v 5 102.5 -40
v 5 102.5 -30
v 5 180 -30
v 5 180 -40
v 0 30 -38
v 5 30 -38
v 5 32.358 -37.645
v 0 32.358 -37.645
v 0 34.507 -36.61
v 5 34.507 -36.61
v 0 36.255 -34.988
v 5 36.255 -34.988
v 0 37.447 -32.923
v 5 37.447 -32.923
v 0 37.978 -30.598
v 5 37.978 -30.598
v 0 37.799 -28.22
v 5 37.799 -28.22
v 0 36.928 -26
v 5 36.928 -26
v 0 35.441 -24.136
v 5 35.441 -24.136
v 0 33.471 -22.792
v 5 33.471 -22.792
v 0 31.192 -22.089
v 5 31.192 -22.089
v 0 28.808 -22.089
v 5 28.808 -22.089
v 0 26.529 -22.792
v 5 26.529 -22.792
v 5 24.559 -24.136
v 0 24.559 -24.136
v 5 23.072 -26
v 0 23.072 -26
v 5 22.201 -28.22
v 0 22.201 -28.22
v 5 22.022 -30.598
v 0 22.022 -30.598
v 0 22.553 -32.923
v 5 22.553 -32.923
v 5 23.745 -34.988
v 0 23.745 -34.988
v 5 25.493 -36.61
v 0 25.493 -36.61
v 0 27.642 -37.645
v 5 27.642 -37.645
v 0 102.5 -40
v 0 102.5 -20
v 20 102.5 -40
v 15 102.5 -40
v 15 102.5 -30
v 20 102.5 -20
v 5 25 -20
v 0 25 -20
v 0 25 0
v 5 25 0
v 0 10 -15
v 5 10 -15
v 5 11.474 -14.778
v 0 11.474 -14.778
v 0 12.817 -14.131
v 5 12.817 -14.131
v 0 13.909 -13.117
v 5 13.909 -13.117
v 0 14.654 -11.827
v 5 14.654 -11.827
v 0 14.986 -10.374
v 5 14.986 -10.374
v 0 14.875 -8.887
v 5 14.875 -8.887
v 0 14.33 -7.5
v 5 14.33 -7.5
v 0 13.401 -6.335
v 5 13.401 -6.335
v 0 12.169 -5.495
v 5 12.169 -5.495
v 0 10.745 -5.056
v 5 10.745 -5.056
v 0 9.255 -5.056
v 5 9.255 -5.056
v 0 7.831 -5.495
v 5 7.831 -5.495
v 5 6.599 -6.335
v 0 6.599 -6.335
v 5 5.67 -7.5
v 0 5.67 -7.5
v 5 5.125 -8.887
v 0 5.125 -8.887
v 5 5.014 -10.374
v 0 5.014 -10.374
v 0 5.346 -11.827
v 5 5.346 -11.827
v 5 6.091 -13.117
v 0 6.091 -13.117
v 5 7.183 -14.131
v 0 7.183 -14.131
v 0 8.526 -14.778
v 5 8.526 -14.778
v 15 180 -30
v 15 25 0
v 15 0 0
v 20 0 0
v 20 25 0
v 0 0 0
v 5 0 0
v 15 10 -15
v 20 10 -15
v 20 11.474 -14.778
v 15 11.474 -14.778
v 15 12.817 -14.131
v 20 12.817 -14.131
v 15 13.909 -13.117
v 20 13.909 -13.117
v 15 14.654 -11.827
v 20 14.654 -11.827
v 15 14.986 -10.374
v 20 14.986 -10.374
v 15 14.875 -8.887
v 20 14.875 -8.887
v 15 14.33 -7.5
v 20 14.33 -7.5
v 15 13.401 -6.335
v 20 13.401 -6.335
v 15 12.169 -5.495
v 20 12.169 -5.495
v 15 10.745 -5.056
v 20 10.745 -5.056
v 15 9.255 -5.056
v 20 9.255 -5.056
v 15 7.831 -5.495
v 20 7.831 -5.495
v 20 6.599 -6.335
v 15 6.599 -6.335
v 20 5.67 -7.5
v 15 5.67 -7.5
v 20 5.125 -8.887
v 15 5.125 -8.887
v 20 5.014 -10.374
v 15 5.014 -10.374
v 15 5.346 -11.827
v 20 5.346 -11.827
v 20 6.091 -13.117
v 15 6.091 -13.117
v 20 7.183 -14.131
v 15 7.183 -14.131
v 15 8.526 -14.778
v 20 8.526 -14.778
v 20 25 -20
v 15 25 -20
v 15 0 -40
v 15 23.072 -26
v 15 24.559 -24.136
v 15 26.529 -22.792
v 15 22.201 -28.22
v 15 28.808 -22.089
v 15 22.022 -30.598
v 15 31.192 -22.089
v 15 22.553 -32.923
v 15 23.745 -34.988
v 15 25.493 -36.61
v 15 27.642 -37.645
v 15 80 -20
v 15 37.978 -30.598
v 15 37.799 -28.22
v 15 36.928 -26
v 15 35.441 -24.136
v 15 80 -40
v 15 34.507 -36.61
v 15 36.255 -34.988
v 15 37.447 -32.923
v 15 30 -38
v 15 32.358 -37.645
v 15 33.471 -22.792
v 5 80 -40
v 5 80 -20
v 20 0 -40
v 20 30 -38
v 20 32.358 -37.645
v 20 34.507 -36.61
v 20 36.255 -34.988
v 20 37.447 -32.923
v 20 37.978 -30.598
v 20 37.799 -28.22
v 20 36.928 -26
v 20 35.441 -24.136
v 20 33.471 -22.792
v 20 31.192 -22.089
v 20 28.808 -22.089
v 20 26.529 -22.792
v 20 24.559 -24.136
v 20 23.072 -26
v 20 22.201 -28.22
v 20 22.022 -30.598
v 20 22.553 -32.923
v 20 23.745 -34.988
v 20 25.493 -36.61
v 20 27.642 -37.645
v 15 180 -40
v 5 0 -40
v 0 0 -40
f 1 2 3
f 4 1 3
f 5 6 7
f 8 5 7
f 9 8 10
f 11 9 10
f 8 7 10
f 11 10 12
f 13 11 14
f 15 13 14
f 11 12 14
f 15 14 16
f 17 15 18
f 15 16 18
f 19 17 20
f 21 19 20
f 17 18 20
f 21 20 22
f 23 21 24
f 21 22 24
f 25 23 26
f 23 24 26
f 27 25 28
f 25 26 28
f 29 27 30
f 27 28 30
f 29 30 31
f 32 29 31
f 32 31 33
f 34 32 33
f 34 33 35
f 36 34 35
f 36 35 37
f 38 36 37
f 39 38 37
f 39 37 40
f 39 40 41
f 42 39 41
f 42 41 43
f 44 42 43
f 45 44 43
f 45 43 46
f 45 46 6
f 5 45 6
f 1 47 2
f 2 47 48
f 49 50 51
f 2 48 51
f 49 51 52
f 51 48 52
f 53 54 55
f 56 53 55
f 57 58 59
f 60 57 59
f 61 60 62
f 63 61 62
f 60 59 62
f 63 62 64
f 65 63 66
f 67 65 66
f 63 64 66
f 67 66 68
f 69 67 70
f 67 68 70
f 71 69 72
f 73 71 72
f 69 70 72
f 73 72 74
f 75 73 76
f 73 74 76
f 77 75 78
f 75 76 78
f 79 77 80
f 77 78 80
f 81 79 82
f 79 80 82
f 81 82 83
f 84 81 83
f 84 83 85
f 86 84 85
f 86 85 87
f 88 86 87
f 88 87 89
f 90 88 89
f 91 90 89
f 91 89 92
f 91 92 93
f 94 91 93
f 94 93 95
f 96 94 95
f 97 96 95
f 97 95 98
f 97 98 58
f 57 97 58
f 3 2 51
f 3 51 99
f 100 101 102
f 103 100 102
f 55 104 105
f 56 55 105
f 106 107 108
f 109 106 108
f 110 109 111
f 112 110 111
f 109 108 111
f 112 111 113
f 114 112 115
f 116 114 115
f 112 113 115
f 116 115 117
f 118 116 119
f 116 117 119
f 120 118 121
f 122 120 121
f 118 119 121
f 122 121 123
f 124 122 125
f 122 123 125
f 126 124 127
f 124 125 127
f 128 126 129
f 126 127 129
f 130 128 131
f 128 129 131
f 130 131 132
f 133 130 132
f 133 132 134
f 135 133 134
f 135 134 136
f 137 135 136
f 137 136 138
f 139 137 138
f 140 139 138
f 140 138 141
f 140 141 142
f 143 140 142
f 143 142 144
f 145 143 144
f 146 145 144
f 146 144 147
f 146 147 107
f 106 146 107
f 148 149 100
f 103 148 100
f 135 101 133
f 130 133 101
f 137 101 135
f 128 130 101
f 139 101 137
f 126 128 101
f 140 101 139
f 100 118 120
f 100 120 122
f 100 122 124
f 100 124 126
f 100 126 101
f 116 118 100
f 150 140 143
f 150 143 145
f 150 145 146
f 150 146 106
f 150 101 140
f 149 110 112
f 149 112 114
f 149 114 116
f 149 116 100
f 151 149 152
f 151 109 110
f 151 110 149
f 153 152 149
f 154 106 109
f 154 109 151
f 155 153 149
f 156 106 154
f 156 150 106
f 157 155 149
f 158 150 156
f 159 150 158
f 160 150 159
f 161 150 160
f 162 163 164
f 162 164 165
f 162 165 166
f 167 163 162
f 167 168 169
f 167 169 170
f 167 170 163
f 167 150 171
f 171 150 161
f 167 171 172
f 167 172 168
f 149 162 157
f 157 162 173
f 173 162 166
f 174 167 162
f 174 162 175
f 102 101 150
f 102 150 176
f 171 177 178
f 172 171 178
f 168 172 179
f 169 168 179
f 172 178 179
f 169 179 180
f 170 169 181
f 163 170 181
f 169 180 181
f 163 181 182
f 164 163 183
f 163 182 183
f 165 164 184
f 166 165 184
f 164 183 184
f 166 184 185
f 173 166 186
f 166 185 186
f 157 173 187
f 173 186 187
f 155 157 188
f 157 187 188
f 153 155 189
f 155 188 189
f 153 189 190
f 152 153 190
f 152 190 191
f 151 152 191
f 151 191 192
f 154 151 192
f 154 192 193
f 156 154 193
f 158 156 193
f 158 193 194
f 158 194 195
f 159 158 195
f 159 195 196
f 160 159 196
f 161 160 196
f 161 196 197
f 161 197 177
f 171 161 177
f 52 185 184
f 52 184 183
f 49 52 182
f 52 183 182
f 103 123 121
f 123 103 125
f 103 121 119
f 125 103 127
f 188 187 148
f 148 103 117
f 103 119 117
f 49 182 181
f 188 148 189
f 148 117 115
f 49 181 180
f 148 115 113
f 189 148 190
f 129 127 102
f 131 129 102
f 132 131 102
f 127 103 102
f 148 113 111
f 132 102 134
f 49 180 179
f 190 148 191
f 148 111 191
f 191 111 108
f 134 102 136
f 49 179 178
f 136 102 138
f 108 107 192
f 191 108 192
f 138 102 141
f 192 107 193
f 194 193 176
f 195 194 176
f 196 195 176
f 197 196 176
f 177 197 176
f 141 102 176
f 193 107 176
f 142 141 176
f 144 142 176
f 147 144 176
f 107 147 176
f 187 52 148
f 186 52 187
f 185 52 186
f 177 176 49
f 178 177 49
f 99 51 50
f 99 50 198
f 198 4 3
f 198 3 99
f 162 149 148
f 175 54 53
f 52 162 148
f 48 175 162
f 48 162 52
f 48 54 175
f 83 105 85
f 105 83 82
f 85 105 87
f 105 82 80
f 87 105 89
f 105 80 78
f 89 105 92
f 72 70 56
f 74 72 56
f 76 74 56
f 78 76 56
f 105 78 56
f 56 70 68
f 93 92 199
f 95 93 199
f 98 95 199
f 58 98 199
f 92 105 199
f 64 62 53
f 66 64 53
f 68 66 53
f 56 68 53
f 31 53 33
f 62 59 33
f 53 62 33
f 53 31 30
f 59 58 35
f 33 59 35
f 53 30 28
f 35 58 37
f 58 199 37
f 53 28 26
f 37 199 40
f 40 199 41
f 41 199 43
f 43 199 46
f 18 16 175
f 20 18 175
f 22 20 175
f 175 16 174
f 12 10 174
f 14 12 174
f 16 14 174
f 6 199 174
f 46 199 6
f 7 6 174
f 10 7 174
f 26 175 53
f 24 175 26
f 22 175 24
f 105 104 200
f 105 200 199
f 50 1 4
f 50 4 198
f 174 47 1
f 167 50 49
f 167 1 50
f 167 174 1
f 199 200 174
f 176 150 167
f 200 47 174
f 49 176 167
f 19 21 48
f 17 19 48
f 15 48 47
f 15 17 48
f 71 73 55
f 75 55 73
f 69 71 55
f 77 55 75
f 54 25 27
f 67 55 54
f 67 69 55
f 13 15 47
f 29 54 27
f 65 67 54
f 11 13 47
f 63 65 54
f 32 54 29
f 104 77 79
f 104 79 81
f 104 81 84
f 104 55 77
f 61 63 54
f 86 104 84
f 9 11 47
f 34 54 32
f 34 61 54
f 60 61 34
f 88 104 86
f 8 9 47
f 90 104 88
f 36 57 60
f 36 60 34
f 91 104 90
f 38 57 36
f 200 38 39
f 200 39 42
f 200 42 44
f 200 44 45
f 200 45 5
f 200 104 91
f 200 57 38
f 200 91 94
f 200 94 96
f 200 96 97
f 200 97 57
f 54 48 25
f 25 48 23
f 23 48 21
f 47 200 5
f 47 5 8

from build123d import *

# Parameters (mm, degrees)
SKETCH1_W           = 20
SKETCH1_H           = 40
BOSS_EXTRUDE1_DEPTH = 180
SKETCH2_W           = 20
SKETCH2_H           = 155
CUT_EXTRUDE1_DEPTH  = 29
SKETCH3_W           = 10
SKETCH3_H           = 77.5
CUT_EXTRUDE2_DEPTH  = 29
SKETCH4_W           = 10
SKETCH4_H           = 80
CUT_EXTRUDE3_DEPTH  = 49
SKETCH5_W           = 5
SKETCH5_H           = 77.5
CUT_EXTRUDE4_DEPTH  = 49
SKETCH6_W           = 5
SKETCH6_H           = 77.5
CUT_EXTRUDE5_DEPTH  = 49
SKETCH7_R           = 5
CUT_EXTRUDE6_DEPTH  = 49
SKETCH8_R           = 8
CUT_EXTRUDE7_DEPTH  = 49


with BuildPart() as part:
    # Sketch1 → Boss-Extrude1 (new body)
    with BuildSketch(Plane(origin=(0, 0, 0), x_dir=(1, 0, 0), z_dir=(0, 1, 0))):
        with Locations((10, 20)):
            Rectangle(SKETCH1_W, SKETCH1_H)
    extrude(amount=BOSS_EXTRUDE1_DEPTH)

    # Sketch2 → Cut-Extrude1 (cut)
    with BuildSketch(Plane.ZY):
        with Locations((-10, 102.5)):
            Rectangle(SKETCH2_W, SKETCH2_H)
    extrude(amount=-CUT_EXTRUDE1_DEPTH, mode=Mode.SUBTRACT)

    # Sketch3 → Cut-Extrude2 (cut)
    with BuildSketch(Plane.ZY):
        with Locations((-25, 141.25)):
            Rectangle(SKETCH3_W, SKETCH3_H)
    extrude(amount=-CUT_EXTRUDE2_DEPTH, mode=Mode.SUBTRACT)

    # Sketch4 → Cut-Extrude3 (cut)
    with BuildSketch(Plane(origin=(0, 0, -40), x_dir=(-1, 0, 0), z_dir=(0, 0, -1))):
        with Locations((-10, 40)):
            Rectangle(SKETCH4_W, SKETCH4_H)
    extrude(amount=-CUT_EXTRUDE3_DEPTH, mode=Mode.SUBTRACT)

    # Sketch5 → Cut-Extrude4 (cut)
    with BuildSketch(Plane.XY.offset(-30)):
        with Locations((2.5, 141.25)):
            Rectangle(SKETCH5_W, SKETCH5_H)
    extrude(amount=-CUT_EXTRUDE4_DEPTH, mode=Mode.SUBTRACT)

    # Sketch6 → Cut-Extrude5 (cut)
    with BuildSketch(Plane.XY.offset(-30)):
        with Locations((17.5, 141.25)):
            Rectangle(SKETCH6_W, SKETCH6_H)
    extrude(amount=-CUT_EXTRUDE5_DEPTH, mode=Mode.SUBTRACT)

    # Sketch7 → Cut-Extrude6 (cut)
    with BuildSketch(Plane(origin=(20, 0, 0), x_dir=(0, 0, -1), z_dir=(1, 0, 0))):
        with Locations((10, 10)):
            Circle(SKETCH7_R)
    extrude(amount=-CUT_EXTRUDE6_DEPTH, mode=Mode.SUBTRACT)

    # Sketch8 → Cut-Extrude7 (cut)
    with BuildSketch(Plane(origin=(20, 0, 0), x_dir=(0, 0, -1), z_dir=(1, 0, 0))):
        with Locations((30, 30)):
            Circle(SKETCH8_R)
    extrude(amount=-CUT_EXTRUDE7_DEPTH, mode=Mode.SUBTRACT)


solid = part.part
